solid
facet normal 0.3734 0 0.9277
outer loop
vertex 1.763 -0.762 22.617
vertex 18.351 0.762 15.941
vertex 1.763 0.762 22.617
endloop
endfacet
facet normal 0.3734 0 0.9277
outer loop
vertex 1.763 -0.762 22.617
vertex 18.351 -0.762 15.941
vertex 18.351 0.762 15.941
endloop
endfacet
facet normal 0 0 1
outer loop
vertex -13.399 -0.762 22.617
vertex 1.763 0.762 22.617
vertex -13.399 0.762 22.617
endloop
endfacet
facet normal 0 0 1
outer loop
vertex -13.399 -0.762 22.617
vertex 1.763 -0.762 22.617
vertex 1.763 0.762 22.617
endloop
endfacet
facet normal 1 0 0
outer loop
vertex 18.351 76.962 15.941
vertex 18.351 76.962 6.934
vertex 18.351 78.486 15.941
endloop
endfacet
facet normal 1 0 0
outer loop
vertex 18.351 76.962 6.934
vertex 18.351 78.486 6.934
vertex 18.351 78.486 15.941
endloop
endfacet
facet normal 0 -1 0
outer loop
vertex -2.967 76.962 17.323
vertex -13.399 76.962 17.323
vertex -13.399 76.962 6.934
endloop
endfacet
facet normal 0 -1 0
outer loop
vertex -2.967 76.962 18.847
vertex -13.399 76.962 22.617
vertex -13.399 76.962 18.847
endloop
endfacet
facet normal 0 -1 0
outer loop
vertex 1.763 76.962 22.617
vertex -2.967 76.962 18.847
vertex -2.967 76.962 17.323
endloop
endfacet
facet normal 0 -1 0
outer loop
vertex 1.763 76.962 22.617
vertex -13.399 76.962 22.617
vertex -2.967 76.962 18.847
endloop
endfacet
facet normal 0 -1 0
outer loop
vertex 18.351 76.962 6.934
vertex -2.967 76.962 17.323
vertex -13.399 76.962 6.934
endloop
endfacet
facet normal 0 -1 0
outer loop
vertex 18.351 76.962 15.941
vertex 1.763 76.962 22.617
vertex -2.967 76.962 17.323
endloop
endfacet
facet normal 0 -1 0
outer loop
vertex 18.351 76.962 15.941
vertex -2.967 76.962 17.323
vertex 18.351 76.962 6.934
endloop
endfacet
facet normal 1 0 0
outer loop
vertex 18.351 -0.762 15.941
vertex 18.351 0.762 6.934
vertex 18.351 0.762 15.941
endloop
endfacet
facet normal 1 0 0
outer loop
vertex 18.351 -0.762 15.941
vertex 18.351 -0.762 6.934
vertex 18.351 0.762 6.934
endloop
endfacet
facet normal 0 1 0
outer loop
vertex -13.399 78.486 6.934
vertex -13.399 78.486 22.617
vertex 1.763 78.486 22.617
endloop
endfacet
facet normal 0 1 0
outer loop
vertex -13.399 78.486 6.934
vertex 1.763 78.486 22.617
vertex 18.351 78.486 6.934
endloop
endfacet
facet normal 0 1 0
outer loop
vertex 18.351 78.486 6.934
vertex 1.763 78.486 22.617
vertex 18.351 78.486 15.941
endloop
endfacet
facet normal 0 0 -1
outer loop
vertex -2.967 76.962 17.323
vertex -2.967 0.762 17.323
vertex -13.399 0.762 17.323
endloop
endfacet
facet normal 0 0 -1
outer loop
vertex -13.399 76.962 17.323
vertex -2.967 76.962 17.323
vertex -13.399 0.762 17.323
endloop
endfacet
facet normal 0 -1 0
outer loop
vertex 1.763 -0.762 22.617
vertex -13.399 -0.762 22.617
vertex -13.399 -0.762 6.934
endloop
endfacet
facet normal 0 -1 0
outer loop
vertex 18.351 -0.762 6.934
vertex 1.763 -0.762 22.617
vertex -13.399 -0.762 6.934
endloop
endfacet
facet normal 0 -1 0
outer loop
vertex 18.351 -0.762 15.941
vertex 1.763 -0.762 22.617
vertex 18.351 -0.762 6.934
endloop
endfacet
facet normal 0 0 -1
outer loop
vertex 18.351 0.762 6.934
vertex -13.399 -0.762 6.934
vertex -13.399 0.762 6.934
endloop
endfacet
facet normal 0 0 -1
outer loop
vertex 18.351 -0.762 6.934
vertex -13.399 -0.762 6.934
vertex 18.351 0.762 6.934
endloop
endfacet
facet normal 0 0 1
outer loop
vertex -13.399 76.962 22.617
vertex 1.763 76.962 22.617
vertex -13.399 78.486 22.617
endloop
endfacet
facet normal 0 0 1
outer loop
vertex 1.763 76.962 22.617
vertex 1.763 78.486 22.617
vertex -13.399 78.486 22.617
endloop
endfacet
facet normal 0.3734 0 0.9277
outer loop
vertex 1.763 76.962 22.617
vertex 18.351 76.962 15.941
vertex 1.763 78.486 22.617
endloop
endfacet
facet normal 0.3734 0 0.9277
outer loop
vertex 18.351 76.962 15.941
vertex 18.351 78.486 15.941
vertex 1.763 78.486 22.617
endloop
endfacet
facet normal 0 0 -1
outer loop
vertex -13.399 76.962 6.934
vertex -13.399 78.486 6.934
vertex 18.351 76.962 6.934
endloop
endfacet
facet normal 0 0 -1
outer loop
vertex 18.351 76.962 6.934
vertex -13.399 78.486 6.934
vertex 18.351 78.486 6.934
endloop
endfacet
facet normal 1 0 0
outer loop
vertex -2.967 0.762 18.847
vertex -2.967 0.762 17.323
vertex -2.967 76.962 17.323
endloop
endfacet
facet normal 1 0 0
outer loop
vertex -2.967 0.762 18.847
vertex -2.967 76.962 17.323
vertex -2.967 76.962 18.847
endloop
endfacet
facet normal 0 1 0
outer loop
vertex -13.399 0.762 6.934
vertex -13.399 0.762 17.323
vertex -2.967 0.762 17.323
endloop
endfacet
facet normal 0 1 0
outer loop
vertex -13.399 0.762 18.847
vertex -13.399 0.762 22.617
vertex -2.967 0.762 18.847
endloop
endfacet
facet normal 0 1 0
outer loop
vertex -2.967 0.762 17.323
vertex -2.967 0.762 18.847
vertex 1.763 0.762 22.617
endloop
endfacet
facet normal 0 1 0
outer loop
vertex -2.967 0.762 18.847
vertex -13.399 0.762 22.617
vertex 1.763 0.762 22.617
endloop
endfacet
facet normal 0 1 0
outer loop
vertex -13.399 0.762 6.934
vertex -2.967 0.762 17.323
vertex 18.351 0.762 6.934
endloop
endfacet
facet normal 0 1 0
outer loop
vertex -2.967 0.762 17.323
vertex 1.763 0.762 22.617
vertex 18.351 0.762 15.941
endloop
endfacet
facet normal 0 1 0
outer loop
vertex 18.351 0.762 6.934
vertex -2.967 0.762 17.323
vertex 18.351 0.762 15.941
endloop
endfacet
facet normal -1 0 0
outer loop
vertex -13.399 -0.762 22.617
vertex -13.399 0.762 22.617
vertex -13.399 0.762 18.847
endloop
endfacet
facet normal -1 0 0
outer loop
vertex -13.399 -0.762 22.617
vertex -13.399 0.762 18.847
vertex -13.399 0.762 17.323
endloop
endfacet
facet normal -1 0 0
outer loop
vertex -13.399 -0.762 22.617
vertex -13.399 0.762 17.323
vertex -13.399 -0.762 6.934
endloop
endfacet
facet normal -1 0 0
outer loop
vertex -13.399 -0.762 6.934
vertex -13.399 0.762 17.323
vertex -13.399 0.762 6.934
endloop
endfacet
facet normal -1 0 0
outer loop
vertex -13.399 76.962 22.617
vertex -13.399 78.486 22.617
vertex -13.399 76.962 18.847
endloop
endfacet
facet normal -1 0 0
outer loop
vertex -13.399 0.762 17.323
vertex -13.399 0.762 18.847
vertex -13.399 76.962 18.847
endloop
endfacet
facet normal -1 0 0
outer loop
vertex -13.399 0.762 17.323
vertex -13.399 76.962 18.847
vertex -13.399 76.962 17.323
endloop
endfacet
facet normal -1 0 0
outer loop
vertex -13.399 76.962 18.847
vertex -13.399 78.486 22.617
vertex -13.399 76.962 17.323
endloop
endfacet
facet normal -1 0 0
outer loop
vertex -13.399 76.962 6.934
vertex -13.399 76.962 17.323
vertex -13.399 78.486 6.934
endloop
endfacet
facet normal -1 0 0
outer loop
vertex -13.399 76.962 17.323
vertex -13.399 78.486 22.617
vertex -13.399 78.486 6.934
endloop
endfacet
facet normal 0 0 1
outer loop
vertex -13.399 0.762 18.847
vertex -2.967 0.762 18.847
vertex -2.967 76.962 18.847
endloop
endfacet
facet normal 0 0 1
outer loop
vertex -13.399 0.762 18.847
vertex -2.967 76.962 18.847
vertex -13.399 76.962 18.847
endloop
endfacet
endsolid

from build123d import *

# Parameters (mm, degrees)
F1_DEPTH = 0.762
F2_W     = 10.4317168638
F2_H     = 1.524
F3_DEPTH = 38.1


with BuildPart() as f1:
    # F0 (on Front) → F1 (new body, symmetric)
    with BuildSketch(Plane.XZ):
        Polygon((1.7629392188, 22.6165422688), (-13.3985944025, 22.6165422688), (-13.3985944025, 6.9341756906), (18.3514055975, 6.9341756906), (18.3514055975, 15.9407987012), align=None)
    extrude(amount=F1_DEPTH, both=True)

    # F2 (on face) → F3 (join)
    with BuildSketch(Plane(origin=(0, 0.762, 0), x_dir=(-1, 0, 0), z_dir=(0, 1, 0))):
        with Locations((8.1827359706, 18.0847395862)):
            Rectangle(F2_W, F2_H)
    extrude(amount=F3_DEPTH)

    # F5: F1 across plane


with BuildPart() as f1_1:
    add(f1.part)
    add(f1.part.mirror(Plane(origin=(-8.1827359706, 38.862, 18.0847395862), x_dir=(-1, 0, 0), z_dir=(0, 1, 0))))


solid = f1_1.part
